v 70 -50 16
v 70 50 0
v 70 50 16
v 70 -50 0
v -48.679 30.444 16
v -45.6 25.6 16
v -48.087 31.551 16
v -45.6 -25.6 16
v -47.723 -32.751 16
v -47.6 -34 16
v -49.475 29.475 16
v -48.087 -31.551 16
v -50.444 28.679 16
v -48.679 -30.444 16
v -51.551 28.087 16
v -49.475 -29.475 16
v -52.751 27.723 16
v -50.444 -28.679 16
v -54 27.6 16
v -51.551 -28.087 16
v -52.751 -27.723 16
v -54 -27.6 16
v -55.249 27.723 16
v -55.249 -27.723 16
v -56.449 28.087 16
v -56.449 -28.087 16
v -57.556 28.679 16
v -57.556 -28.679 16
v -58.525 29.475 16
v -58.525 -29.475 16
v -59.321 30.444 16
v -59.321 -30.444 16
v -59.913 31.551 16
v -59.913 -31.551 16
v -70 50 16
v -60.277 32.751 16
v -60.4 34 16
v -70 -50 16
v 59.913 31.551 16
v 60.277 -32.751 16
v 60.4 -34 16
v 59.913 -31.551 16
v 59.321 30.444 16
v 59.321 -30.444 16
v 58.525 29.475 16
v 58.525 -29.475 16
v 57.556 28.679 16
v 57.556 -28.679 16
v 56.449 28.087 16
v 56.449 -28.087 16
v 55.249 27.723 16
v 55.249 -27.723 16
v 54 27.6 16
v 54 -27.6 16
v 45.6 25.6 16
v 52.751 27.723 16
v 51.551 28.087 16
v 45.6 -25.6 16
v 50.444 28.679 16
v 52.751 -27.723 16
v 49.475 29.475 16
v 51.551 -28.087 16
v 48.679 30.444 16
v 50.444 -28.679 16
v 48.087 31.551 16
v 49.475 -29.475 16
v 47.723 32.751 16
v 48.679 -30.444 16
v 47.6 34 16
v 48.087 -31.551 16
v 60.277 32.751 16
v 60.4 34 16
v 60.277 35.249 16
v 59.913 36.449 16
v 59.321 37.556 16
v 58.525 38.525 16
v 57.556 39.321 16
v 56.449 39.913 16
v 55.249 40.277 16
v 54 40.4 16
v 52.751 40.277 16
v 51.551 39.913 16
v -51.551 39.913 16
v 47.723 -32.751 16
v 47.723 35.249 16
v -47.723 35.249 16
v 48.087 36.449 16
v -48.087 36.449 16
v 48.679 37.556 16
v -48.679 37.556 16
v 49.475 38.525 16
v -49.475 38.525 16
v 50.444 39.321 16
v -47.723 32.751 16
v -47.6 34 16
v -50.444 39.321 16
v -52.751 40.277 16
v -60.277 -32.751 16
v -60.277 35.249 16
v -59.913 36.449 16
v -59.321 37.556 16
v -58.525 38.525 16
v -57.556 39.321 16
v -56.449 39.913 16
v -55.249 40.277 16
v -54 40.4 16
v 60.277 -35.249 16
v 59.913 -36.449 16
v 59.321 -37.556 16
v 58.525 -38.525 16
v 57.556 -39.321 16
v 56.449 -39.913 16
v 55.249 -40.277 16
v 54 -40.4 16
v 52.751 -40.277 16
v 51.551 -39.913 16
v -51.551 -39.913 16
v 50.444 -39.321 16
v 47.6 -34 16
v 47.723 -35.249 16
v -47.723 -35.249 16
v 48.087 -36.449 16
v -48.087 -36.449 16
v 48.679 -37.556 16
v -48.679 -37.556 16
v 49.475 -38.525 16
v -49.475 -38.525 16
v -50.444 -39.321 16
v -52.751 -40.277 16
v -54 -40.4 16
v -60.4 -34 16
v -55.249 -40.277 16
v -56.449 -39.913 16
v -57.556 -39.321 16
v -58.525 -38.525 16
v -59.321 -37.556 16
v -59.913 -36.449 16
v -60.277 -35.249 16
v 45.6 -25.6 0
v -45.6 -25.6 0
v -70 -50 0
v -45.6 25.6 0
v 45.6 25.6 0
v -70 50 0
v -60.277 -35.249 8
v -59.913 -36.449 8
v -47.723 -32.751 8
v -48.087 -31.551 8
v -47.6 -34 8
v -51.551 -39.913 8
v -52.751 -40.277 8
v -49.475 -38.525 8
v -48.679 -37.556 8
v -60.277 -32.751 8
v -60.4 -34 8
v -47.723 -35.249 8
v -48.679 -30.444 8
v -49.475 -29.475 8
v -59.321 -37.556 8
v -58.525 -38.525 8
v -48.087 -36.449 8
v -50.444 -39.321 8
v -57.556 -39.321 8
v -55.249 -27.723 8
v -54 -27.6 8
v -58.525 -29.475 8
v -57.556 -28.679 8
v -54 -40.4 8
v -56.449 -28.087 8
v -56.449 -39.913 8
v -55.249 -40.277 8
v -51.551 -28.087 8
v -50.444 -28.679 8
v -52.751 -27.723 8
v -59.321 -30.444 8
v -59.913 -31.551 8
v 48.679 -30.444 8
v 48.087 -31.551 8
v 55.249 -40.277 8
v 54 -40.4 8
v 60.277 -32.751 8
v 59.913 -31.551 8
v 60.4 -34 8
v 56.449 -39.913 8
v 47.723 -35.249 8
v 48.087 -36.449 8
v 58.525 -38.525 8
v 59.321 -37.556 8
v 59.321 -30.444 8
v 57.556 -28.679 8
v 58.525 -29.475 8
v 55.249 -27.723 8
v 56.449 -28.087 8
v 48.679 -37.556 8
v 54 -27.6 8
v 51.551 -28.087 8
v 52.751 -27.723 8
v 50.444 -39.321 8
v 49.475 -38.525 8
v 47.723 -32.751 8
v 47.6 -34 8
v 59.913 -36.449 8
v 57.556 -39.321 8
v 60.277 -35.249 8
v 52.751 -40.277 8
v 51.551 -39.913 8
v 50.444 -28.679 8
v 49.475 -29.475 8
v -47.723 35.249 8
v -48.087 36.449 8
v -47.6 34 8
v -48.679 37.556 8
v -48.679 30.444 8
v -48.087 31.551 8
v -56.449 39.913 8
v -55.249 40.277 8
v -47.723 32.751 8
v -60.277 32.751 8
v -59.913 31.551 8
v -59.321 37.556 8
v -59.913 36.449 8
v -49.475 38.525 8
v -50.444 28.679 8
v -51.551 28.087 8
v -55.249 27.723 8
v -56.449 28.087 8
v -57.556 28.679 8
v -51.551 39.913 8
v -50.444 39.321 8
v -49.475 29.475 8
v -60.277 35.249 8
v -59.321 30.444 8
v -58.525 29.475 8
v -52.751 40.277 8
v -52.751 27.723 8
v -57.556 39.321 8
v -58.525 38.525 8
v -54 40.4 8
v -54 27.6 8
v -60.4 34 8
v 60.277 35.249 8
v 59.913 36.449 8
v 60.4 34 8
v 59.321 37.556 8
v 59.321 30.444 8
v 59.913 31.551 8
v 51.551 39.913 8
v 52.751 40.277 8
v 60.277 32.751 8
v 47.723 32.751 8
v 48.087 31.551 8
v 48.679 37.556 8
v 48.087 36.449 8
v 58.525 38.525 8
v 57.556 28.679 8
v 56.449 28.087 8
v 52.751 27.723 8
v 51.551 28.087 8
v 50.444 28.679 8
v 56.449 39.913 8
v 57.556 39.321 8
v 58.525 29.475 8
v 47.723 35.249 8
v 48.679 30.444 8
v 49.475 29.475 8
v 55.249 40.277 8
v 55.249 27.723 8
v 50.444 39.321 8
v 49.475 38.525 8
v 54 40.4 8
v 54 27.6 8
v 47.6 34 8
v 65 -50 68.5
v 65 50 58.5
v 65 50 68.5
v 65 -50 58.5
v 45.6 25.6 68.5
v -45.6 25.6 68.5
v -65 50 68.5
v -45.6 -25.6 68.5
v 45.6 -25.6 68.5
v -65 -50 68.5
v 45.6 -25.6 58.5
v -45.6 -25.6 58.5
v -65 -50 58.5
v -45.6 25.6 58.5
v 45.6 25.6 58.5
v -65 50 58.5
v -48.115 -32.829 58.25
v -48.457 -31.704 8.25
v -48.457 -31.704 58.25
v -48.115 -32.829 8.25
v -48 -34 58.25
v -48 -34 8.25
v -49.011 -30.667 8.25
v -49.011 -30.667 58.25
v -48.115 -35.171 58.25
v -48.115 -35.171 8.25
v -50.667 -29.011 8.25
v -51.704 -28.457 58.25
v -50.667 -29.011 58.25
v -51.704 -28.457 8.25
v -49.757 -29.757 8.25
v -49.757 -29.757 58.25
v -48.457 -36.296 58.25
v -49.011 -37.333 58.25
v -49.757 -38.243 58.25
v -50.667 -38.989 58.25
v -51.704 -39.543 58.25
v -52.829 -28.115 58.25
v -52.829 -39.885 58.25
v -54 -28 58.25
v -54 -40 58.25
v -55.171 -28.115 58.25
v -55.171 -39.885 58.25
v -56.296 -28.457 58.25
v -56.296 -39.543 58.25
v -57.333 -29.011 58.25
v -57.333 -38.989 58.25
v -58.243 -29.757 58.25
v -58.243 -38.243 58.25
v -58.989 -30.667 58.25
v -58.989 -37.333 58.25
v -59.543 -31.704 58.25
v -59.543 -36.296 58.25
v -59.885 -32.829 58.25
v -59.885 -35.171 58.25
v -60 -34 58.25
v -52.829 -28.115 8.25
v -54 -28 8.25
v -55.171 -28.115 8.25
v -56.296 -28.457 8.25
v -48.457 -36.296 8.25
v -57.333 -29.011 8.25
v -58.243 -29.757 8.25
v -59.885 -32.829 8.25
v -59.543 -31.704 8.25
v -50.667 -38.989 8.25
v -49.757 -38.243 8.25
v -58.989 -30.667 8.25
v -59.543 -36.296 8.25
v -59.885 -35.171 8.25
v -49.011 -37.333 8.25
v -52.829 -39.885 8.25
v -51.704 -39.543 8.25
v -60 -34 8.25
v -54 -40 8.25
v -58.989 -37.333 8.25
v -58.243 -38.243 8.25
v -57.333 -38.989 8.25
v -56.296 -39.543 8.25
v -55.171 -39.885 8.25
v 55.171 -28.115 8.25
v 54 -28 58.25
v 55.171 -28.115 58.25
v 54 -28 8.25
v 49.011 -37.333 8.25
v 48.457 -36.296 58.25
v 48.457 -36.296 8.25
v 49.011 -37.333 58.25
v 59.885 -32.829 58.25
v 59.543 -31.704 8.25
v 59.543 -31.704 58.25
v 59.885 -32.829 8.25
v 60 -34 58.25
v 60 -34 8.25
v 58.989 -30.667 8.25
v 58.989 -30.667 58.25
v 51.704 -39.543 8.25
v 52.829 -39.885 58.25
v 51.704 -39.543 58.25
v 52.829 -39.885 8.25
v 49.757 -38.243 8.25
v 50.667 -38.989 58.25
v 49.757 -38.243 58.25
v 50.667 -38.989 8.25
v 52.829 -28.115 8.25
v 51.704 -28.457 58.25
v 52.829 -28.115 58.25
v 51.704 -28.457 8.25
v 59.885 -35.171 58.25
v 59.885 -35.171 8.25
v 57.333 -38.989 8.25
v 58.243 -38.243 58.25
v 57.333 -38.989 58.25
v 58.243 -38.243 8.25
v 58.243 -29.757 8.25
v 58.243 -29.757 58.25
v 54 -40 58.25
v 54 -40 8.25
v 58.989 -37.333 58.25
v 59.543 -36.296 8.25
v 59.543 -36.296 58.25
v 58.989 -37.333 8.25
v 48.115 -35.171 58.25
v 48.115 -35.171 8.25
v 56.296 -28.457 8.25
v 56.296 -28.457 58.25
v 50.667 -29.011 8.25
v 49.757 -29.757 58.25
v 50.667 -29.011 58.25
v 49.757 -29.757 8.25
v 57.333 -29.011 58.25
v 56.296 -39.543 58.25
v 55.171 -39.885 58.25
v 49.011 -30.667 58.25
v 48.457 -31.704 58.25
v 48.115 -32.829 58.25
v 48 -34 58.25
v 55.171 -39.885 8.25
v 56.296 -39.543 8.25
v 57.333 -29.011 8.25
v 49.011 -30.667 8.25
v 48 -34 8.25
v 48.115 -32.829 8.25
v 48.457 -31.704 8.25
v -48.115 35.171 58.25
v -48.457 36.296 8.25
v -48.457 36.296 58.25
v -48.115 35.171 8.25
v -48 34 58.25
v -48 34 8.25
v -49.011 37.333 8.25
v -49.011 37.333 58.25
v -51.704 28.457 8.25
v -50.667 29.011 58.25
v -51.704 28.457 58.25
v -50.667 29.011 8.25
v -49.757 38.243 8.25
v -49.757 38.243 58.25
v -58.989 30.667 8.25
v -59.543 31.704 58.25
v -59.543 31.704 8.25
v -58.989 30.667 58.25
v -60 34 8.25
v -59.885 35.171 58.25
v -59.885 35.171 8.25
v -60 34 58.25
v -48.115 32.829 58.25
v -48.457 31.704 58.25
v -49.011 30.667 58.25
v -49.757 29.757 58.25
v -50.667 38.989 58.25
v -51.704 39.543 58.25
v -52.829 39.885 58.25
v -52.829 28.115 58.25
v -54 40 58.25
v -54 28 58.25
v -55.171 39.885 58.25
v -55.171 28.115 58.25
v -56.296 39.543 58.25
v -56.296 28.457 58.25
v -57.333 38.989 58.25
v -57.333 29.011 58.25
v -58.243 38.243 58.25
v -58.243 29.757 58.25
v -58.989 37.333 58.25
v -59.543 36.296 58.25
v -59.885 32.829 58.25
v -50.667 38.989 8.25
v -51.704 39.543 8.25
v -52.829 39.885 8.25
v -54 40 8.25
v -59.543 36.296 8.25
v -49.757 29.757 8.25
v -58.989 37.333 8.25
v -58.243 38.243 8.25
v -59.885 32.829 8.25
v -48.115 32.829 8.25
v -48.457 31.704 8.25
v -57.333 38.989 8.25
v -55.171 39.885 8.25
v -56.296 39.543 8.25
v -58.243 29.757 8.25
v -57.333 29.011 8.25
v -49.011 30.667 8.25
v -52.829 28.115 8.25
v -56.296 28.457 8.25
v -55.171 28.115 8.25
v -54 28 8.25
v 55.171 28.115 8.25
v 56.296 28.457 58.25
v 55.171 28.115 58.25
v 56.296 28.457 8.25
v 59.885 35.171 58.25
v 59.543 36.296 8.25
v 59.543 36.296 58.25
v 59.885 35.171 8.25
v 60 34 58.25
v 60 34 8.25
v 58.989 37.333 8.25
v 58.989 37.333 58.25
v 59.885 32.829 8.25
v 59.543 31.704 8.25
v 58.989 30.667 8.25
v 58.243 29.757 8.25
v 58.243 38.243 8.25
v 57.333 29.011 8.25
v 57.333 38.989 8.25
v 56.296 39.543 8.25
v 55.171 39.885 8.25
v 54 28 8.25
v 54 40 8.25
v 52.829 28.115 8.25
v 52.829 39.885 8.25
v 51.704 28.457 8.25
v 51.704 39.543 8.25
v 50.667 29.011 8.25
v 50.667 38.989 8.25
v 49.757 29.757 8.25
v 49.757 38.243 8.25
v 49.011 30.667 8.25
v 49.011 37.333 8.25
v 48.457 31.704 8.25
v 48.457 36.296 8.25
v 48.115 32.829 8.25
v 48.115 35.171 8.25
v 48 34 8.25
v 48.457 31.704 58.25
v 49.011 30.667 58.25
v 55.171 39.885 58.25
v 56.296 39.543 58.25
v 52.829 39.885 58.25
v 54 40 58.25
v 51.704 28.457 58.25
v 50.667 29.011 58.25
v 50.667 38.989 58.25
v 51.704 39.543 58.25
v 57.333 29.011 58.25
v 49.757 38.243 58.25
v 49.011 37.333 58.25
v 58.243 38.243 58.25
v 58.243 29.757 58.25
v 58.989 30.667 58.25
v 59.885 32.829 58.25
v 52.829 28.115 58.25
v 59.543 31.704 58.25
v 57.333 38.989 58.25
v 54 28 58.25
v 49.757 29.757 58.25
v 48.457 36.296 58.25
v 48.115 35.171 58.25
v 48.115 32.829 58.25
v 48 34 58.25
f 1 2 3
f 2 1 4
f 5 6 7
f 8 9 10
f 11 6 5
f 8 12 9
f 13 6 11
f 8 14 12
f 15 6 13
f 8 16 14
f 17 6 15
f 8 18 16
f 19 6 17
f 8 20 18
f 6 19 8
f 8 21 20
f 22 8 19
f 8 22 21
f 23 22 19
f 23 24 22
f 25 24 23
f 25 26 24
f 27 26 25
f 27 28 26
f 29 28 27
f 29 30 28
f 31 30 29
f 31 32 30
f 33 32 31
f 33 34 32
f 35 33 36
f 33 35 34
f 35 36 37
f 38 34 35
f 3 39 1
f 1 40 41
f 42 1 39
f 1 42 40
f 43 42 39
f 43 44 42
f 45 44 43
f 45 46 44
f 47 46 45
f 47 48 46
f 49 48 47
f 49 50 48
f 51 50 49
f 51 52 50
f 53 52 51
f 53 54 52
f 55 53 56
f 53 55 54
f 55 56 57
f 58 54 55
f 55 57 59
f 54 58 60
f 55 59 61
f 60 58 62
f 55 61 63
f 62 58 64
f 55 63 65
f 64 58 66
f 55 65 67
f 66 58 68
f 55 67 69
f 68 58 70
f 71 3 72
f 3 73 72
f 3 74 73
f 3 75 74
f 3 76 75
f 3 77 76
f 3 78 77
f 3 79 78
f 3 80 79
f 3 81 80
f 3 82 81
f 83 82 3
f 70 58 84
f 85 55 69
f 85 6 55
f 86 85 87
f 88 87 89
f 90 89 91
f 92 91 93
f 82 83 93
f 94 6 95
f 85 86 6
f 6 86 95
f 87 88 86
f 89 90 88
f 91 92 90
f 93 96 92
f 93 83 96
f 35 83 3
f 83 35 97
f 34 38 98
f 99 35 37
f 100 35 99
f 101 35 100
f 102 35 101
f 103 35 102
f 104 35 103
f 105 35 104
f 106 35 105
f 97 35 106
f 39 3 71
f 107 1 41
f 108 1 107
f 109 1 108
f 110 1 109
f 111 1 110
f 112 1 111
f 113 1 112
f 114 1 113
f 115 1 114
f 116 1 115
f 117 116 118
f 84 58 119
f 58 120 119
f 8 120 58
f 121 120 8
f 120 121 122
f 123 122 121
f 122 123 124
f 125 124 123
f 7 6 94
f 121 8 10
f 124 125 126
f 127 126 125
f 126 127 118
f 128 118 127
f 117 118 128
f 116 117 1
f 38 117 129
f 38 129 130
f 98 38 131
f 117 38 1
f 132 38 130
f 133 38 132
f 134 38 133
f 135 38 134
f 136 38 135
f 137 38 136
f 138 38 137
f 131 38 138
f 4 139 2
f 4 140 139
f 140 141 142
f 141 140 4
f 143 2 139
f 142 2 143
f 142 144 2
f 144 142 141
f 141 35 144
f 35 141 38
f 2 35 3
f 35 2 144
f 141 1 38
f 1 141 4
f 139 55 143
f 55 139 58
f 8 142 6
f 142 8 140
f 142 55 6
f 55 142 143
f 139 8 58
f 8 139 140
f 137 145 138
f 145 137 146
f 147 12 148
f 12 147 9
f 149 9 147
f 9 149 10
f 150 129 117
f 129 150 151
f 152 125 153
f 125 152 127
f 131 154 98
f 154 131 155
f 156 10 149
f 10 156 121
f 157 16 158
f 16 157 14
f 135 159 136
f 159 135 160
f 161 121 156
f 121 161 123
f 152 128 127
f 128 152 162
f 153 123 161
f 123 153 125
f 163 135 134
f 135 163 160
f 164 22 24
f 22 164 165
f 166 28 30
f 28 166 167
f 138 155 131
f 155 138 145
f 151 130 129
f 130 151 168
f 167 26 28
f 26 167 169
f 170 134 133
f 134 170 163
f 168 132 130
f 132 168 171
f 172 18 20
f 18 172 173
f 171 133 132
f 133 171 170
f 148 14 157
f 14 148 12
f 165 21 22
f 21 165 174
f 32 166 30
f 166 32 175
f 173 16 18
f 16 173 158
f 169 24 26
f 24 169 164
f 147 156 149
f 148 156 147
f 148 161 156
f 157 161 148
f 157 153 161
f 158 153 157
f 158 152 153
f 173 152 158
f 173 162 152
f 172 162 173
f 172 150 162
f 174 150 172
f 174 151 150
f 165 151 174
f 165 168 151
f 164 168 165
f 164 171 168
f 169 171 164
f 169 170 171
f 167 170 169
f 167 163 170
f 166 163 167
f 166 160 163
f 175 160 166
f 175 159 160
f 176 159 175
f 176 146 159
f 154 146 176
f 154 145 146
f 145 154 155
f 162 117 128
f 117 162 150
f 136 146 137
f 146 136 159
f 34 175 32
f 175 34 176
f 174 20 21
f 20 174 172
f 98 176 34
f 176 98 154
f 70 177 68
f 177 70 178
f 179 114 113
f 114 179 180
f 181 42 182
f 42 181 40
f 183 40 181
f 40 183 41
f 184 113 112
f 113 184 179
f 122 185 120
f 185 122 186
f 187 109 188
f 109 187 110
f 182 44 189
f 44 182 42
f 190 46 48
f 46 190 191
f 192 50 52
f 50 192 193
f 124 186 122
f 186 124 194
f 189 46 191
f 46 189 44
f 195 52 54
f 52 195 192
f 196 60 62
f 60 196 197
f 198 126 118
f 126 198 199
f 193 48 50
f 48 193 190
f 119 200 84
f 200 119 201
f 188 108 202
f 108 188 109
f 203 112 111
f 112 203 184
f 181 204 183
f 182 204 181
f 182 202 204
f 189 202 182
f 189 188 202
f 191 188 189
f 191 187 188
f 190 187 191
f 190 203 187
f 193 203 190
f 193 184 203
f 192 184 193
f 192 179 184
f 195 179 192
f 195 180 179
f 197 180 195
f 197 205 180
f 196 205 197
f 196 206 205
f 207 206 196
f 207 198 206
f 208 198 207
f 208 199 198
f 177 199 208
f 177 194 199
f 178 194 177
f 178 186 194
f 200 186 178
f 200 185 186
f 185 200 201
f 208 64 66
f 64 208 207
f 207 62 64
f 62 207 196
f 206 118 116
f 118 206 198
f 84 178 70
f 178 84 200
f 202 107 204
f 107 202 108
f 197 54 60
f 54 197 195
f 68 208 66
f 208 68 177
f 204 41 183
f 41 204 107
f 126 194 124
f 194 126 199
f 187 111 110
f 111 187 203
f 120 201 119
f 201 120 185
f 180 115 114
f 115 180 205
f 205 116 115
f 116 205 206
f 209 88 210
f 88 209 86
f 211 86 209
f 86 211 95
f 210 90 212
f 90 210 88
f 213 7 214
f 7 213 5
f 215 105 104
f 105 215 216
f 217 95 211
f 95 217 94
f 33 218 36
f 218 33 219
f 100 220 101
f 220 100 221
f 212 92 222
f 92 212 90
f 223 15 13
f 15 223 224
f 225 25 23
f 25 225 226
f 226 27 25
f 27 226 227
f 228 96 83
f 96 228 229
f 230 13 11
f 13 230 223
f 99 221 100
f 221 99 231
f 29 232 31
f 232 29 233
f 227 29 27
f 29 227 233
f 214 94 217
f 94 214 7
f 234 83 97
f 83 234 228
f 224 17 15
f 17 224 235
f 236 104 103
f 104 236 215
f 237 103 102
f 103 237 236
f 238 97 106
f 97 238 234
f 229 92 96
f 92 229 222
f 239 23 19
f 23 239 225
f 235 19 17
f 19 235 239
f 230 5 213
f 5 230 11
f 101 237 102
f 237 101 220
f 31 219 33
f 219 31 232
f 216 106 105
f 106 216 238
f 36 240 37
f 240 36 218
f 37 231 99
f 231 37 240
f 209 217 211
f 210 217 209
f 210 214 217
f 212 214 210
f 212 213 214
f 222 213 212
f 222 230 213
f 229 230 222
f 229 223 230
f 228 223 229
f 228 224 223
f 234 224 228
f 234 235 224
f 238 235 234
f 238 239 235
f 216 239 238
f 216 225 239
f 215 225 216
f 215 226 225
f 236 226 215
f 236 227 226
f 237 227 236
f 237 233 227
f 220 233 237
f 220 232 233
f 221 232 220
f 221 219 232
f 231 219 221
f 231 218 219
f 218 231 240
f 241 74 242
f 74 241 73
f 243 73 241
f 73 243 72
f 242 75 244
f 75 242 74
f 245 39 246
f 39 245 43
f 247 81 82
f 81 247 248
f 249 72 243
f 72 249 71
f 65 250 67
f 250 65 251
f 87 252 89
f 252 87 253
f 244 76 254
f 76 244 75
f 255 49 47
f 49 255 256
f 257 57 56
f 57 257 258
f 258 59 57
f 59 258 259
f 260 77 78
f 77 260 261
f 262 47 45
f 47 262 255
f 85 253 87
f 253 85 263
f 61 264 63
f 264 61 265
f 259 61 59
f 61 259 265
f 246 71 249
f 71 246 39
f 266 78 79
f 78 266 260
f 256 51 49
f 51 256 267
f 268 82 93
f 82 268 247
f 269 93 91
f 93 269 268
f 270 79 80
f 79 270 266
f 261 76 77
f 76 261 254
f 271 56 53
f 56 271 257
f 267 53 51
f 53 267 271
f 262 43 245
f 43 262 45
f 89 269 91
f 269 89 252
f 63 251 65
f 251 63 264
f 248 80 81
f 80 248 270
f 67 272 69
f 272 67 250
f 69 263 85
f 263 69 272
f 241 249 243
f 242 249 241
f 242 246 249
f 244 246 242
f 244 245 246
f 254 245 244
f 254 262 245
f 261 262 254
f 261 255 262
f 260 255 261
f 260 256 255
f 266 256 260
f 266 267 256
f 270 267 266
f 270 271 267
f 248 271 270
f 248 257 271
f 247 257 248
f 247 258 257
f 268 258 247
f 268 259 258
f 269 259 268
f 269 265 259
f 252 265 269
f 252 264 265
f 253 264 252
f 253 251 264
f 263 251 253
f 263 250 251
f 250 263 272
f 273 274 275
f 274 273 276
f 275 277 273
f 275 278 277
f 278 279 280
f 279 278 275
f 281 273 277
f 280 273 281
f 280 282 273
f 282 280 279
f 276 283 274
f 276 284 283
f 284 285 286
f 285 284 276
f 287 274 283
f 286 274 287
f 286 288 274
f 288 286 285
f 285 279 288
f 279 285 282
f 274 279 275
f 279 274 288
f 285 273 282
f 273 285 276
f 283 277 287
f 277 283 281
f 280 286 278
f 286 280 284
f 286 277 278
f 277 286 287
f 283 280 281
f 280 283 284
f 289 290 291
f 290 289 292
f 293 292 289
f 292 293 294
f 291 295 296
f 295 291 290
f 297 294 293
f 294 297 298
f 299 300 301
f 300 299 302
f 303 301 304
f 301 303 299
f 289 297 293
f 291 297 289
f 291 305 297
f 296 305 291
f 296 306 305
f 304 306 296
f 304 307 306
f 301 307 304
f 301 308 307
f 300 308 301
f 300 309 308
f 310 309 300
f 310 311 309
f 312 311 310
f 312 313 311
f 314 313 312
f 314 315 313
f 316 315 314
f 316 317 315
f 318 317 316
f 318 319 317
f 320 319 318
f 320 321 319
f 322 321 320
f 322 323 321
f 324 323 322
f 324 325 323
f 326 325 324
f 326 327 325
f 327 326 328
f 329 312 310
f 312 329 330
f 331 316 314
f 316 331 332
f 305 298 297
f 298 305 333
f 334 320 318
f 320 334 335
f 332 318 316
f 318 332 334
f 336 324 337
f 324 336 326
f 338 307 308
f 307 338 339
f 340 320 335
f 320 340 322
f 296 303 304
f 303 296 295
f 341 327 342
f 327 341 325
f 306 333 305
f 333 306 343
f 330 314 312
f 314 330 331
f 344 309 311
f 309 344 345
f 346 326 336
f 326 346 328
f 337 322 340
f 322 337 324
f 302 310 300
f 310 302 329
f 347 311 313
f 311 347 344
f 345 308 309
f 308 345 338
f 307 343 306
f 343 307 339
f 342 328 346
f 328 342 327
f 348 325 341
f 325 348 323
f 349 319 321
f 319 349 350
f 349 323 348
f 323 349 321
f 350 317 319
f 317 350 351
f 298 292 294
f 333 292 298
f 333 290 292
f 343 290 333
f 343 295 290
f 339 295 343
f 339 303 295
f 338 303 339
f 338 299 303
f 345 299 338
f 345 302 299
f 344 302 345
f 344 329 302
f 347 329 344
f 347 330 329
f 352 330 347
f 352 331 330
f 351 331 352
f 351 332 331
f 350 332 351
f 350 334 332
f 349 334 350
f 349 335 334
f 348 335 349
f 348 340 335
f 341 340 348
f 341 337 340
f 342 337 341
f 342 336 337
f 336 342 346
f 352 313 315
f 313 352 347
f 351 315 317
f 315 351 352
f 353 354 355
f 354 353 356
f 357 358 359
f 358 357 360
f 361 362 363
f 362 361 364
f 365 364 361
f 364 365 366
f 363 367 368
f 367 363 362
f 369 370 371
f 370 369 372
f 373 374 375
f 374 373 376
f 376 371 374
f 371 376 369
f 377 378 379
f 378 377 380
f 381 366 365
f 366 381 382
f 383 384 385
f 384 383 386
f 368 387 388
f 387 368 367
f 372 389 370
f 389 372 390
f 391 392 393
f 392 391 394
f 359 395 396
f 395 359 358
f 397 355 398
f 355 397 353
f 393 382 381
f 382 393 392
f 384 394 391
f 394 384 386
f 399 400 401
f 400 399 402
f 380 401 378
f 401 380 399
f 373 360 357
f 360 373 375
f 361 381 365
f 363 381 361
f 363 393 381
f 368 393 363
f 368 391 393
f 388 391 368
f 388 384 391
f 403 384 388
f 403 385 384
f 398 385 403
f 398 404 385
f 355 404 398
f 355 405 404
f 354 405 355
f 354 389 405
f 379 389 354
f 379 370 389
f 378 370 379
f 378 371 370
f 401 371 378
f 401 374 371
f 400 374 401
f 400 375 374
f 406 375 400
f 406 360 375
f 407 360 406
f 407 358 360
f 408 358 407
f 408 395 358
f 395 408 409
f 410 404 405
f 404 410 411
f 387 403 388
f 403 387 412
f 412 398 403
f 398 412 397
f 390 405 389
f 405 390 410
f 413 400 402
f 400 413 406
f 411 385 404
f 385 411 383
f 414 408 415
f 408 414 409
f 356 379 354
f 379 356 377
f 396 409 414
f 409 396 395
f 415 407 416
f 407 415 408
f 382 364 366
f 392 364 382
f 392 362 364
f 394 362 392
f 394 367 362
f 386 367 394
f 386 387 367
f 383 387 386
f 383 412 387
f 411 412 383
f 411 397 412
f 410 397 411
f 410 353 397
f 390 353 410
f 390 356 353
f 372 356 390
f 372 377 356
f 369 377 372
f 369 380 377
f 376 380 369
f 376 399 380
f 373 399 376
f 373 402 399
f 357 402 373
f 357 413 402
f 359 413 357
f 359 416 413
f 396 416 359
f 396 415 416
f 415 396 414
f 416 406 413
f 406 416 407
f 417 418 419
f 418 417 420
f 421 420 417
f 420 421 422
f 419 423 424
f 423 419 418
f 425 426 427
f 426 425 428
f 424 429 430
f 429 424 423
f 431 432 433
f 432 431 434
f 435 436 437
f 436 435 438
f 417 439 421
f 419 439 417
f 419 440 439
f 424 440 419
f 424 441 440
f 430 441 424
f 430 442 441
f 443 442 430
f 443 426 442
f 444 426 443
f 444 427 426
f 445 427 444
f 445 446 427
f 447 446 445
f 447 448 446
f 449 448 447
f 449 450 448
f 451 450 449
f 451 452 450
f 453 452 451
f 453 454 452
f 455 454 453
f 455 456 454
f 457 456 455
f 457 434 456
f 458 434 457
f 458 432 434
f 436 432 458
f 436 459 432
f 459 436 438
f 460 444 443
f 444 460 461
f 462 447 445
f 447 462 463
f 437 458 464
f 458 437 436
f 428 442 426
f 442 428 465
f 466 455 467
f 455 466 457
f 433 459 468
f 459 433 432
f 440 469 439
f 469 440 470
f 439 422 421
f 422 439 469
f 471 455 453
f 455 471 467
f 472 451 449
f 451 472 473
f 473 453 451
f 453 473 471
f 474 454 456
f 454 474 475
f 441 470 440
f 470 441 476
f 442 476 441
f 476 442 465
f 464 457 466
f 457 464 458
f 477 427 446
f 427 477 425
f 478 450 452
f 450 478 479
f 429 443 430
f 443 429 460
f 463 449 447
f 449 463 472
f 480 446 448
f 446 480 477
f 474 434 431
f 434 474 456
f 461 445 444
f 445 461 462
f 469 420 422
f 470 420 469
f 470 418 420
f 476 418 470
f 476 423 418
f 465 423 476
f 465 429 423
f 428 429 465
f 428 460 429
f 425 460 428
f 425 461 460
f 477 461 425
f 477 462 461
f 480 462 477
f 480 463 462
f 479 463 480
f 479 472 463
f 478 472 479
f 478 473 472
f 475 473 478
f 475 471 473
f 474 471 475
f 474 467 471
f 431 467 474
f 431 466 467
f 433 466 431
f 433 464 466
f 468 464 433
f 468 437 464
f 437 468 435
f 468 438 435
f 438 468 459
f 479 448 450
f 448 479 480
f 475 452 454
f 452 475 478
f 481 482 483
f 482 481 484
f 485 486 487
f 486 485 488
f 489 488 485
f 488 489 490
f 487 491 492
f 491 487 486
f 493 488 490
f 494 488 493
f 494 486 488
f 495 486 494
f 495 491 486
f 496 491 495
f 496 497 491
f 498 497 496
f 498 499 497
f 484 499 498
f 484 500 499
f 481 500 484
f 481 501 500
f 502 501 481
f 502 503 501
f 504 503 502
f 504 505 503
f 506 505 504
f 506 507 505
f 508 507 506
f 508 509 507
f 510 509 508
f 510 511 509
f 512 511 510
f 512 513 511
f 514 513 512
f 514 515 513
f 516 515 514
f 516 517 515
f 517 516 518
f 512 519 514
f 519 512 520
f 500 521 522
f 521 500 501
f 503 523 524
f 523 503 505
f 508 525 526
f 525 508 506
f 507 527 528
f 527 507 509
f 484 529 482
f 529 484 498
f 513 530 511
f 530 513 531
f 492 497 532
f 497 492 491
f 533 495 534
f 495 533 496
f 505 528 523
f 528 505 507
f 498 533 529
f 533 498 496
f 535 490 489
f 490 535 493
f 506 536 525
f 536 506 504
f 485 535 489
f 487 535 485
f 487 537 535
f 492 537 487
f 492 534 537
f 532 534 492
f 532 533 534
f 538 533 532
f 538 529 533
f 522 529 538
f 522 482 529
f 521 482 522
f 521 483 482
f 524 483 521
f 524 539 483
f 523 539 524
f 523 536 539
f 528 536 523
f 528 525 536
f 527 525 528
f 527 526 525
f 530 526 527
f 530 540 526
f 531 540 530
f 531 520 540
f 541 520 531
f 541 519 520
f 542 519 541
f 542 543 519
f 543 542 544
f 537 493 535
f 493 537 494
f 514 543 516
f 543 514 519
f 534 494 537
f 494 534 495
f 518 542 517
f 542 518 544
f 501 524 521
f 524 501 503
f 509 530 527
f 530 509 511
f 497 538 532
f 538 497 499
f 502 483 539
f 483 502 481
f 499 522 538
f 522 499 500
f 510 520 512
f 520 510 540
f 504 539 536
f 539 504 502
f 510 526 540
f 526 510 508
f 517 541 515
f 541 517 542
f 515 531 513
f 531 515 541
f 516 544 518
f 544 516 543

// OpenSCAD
$fn = 32;

// ------------------------------------------------------------------------
// Frame cube: base 140 x 100 mm, posts 50 mm tall
// Every part is its own module, assembly() places every instance.
// ------------------------------------------------------------------------

// --- part 1 ---
module base_frame() {
  difference() {
    translate([-70, -50, 0]) cube([140, 100, 16]);
    translate([-45.6, -25.6, -1]) cube([91.2, 51.2, 18]);
    translate([-54, -34, 8]) cylinder(h = 9, d = 12.8);
    translate([54, -34, 8]) cylinder(h = 9, d = 12.8);
    translate([-54, 34, 8]) cylinder(h = 9, d = 12.8);
    translate([54, 34, 8]) cylinder(h = 9, d = 12.8);
  }
}

// --- part 2 ---
module corner_post() {
  cylinder(h = 50, d = 12);
}

// --- part 3 ---
module top_frame() {
  difference() {
    translate([-65, -50, 0]) cube([130, 100, 10]);
    translate([-45.6, -25.6, -1]) cube([91.2, 51.2, 12]);
  }
}

// --- assembly ---
module assembly() {
  color([0.80, 0.24, 0.20]) translate([0, 0, 0]) rotate([0, 0, 0]) base_frame();
  color([0.20, 0.45, 0.75]) translate([-54, -34, 8.25]) rotate([0, 0, 0]) corner_post();
  color([0.25, 0.62, 0.32]) translate([54, -34, 8.25]) rotate([0, 0, 0]) corner_post();
  color([0.92, 0.70, 0.18]) translate([-54, 34, 8.25]) rotate([0, 0, 0]) corner_post();
  color([0.58, 0.35, 0.70]) translate([54, 34, 8.25]) rotate([0, 0, 0]) corner_post();
  color([0.16, 0.66, 0.66]) translate([0, 0, 58.5]) rotate([0, 0, 0]) top_frame();
}

assembly();
